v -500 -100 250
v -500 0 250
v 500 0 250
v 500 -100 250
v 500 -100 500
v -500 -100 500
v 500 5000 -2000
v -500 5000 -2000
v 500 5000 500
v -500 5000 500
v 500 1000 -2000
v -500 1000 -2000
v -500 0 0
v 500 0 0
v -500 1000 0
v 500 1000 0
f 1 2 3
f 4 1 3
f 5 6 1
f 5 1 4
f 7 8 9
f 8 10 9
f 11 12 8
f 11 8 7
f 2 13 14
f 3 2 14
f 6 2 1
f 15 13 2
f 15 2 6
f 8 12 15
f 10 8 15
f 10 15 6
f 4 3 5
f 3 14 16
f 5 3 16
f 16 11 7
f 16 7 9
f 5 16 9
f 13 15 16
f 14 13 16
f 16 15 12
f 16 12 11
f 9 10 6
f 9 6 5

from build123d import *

# Parameters (mm, degrees)
F1_DEPTH = 500
F2_W     = 1000
F2_H     = 4000
F3_DEPTH = 2000
F4_W     = 1000
F4_H     = 250
F5_DEPTH = 100


with BuildPart() as f1:
    # F0 (on Top) → F1 (new body)
    with BuildSketch(Plane.XY):
        Polygon((-500, 0), (0, 0), (500, 0), (500, 5000), (0, 5000), (-500, 5000), align=None)
    extrude(amount=F1_DEPTH)

    # F2 (on face) → F3 (join)
    with BuildSketch(Plane(origin=(0, 0, 0), x_dir=(1, 0, 0), z_dir=(0, 0, -1))):
        with Locations((0, -3000)):
            Rectangle(F2_W, F2_H)
    extrude(amount=F3_DEPTH)

    # F4 (on face) → F5 (join)
    with BuildSketch(Plane.XZ):
        with Locations((0, 375)):
            Rectangle(F4_W, F4_H)
    extrude(amount=F5_DEPTH)


solid = f1.part
